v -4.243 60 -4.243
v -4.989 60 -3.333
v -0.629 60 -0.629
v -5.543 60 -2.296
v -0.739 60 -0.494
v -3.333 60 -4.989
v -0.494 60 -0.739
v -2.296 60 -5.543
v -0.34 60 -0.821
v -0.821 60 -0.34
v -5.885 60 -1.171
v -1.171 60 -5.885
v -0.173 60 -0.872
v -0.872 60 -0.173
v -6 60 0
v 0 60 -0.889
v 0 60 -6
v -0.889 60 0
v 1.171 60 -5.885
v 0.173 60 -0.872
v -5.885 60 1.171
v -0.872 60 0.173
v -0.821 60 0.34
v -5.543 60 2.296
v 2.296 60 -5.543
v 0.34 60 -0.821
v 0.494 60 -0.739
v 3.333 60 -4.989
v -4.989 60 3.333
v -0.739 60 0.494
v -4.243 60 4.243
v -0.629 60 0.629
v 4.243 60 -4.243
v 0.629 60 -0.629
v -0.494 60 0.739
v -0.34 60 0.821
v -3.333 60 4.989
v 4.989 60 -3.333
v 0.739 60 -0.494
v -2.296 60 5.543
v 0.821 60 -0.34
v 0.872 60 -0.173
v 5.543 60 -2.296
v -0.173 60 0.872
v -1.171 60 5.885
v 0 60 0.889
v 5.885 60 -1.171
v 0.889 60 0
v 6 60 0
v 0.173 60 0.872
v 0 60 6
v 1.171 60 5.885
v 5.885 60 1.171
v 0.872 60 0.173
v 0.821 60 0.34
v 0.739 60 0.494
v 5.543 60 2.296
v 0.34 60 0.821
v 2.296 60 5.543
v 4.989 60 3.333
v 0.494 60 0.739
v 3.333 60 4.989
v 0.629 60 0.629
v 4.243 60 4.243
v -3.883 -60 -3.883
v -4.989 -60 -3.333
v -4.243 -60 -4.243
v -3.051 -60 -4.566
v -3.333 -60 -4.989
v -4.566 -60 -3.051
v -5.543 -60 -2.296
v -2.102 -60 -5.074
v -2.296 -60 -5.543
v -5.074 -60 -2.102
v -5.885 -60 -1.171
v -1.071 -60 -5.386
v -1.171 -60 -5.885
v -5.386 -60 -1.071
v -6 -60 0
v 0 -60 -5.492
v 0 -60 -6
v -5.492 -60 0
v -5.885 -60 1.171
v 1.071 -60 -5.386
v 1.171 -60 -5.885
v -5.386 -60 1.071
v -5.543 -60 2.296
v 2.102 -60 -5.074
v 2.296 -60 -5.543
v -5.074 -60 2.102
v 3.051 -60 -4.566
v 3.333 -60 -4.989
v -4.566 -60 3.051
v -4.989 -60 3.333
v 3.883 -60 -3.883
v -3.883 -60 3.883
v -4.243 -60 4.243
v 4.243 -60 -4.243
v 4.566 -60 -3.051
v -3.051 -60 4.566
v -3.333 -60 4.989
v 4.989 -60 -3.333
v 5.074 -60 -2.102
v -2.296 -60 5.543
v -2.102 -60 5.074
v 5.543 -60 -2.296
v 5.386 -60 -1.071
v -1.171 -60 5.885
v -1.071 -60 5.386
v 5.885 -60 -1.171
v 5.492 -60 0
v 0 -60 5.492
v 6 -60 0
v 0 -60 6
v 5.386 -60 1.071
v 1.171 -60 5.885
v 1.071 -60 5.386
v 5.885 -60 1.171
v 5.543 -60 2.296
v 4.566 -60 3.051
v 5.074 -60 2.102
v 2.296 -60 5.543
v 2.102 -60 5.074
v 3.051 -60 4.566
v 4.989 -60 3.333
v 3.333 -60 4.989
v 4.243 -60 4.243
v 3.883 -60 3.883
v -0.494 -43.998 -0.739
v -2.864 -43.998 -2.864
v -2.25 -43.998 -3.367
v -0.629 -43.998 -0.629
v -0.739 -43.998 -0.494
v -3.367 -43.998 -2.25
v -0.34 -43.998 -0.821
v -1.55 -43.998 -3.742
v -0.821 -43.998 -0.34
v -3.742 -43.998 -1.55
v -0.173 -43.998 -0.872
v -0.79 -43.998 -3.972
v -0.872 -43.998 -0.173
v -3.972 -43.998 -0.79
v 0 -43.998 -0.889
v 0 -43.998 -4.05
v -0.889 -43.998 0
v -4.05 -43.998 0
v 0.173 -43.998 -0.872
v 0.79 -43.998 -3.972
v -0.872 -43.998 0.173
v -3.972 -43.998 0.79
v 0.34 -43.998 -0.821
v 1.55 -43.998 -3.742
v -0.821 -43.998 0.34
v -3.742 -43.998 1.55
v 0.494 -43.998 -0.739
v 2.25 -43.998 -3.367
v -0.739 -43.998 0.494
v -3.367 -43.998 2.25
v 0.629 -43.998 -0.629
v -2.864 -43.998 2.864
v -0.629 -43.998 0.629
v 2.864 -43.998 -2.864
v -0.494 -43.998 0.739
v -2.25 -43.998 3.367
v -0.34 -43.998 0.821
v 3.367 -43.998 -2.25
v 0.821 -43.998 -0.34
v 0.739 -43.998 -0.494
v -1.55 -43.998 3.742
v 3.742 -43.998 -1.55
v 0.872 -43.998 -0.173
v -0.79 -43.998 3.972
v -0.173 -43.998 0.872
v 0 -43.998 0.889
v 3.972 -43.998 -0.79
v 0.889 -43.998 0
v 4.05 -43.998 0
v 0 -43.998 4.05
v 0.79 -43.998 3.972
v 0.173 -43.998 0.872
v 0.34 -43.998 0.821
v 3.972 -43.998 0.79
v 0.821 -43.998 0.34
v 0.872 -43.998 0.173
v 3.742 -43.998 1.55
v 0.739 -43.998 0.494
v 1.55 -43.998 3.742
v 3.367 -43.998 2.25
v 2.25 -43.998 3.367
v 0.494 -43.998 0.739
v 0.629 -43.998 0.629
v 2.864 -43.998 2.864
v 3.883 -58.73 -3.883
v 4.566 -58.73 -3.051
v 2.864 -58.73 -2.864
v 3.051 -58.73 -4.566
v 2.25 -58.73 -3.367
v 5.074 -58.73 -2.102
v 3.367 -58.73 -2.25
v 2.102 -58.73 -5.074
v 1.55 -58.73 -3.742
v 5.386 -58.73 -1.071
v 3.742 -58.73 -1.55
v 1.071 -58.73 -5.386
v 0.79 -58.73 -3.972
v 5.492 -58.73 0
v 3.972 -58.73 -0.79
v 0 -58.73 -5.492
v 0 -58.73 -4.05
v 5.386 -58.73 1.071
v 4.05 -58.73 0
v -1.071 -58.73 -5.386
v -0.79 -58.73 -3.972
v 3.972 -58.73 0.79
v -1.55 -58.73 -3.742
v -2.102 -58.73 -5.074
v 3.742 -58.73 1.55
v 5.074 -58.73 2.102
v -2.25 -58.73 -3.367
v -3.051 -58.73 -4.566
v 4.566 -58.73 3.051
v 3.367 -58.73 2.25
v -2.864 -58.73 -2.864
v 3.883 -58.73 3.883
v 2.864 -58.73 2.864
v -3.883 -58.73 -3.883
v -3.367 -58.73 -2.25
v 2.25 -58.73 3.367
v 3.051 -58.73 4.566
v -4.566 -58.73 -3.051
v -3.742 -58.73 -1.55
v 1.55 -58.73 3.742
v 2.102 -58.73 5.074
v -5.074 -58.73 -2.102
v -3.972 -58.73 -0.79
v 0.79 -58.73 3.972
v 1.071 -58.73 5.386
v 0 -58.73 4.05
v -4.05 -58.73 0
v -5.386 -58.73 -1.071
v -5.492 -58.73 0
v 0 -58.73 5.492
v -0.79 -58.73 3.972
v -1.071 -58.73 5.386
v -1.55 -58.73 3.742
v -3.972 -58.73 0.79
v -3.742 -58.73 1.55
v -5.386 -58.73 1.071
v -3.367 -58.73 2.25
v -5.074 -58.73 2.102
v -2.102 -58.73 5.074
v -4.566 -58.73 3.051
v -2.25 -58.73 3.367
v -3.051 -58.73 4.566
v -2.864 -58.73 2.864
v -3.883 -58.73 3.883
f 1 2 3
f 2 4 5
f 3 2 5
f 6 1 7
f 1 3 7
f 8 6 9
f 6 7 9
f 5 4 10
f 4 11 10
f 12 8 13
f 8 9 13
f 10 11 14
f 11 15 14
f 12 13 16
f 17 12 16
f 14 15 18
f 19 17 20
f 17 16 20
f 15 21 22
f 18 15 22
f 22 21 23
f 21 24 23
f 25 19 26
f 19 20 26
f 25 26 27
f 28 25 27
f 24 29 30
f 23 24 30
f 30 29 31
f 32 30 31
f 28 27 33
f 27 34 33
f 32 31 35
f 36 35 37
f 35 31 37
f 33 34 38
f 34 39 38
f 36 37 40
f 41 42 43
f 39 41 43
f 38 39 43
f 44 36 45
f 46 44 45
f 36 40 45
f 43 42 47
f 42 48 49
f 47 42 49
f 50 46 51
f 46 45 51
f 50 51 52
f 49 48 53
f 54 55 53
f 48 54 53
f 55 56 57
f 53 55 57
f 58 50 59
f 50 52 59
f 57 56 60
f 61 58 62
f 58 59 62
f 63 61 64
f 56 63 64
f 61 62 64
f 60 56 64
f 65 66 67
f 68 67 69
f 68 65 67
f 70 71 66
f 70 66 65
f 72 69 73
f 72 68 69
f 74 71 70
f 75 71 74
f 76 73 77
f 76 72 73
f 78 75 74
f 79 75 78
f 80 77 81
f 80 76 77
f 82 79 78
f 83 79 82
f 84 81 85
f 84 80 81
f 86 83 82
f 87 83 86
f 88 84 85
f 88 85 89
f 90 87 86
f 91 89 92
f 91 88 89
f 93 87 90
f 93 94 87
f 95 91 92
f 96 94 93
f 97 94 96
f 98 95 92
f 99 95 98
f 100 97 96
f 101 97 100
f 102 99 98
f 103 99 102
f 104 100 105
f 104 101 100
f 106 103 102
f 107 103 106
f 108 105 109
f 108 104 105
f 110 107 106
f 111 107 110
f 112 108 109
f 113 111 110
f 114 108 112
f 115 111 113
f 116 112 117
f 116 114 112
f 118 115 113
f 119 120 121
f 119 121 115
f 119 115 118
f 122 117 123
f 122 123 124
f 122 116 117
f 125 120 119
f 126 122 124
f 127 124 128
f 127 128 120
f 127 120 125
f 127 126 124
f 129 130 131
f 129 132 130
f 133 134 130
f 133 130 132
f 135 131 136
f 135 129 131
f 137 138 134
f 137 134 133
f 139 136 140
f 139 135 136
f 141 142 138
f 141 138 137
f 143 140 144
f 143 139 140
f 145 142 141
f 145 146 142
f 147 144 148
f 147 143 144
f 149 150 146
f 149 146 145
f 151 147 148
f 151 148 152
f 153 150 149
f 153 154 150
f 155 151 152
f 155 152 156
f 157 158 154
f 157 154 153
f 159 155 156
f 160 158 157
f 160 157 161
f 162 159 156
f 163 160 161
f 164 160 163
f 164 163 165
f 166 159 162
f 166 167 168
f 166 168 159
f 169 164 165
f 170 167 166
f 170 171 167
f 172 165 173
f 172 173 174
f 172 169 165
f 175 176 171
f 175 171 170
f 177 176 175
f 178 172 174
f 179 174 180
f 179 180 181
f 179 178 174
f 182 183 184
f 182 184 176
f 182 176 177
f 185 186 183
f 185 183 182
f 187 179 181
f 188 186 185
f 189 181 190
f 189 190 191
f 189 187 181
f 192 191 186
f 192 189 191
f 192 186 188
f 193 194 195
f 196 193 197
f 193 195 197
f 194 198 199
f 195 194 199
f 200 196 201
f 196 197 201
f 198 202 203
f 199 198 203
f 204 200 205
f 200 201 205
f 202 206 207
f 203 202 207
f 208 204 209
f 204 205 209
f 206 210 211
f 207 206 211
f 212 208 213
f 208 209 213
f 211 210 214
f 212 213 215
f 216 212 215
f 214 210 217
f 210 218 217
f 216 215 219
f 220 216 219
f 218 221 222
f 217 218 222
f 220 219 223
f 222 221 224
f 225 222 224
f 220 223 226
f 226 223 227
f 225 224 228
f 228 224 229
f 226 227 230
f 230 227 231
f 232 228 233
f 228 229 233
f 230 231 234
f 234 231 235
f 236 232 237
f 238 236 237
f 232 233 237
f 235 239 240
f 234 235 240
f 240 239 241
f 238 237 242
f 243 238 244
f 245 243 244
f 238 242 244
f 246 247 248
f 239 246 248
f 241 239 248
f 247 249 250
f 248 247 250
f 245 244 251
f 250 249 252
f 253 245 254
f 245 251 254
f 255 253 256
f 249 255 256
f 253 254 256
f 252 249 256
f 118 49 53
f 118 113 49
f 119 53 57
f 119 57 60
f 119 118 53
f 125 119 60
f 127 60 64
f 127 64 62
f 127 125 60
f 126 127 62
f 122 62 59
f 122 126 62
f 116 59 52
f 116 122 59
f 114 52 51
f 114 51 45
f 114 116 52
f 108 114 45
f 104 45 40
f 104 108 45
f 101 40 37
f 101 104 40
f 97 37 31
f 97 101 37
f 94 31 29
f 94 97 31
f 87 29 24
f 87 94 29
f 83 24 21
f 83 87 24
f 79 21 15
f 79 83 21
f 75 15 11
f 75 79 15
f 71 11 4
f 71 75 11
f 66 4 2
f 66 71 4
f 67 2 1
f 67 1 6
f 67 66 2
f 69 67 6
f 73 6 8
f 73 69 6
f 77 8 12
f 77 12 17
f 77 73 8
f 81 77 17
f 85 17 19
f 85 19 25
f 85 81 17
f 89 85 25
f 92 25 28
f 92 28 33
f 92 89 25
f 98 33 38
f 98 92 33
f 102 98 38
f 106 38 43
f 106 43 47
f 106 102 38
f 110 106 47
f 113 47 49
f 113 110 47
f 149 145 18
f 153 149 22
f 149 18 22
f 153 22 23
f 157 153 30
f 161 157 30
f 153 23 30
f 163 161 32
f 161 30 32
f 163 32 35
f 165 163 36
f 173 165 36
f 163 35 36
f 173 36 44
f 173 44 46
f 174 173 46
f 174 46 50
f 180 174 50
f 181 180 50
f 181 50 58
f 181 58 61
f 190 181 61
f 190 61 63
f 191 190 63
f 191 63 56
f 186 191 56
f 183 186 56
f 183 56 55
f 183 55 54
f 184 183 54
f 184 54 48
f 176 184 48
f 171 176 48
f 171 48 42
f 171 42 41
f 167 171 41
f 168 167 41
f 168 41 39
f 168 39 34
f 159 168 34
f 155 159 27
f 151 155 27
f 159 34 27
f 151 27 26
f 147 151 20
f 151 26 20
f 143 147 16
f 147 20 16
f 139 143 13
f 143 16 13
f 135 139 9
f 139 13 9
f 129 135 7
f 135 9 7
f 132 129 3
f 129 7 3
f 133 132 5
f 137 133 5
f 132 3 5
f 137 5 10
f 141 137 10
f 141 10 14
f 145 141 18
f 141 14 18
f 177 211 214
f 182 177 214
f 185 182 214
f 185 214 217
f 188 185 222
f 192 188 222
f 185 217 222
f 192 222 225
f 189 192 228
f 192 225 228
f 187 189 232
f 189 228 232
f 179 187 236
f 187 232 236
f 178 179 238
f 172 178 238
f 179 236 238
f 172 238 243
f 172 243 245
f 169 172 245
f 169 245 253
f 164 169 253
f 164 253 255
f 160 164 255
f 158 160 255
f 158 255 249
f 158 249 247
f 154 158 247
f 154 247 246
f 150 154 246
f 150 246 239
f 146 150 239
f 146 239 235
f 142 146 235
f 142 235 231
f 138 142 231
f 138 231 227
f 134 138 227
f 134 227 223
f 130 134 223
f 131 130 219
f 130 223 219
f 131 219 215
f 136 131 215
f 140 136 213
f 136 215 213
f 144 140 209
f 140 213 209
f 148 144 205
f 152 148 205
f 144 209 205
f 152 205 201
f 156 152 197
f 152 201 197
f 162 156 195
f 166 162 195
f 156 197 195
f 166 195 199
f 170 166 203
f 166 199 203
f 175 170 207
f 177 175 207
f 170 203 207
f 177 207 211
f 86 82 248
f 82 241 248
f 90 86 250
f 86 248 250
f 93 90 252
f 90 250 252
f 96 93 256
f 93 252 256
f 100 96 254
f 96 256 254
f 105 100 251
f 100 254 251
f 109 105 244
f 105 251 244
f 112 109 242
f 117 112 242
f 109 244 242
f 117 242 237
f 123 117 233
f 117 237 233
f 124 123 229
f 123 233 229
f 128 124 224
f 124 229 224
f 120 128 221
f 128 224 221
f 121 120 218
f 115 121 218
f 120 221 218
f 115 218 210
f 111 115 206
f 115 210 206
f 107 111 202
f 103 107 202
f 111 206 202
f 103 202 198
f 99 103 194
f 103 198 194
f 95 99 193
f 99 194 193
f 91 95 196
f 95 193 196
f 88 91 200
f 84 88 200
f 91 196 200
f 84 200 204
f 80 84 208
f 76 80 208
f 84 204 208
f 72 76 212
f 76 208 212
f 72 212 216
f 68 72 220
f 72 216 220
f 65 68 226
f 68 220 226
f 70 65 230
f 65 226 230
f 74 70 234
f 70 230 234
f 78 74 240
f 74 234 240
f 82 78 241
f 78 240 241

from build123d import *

# Parameters (mm, degrees)
F0_R     = 6
F1_DEPTH = 60
F2_R     = 4.05
F3_DEPTH = 16.002
F4_R     = 0.889
F5_DEPTH = 120.001
F6_W     = 1.651
F6_H     = 1.27


with BuildPart() as f1:
    # F0 (on Front) → F1 (new body, symmetric)
    with BuildSketch(Plane.XZ):
        Circle(F0_R)
    extrude(amount=F1_DEPTH, both=True)

    # F2 (on face) → F3 (cut)
    with BuildSketch(Plane.XZ.offset(60)):
        Circle(F2_R)
    extrude(amount=-F3_DEPTH, mode=Mode.SUBTRACT)

    # F4 (on face) → F5 (cut, through all)
    with BuildSketch(Plane(origin=(0, 60, 0), x_dir=(-1, 0, 0), z_dir=(0, 1, 0))):
        Circle(F4_R)
    extrude(amount=-F5_DEPTH, mode=Mode.SUBTRACT)

    # F6 (on Top) → F7 (revolve, cut)
    with BuildSketch(Plane.XY):
        with Locations((-4.6665, -59.365)):
            Rectangle(F6_W, F6_H)
    revolve(axis=Axis((0, -59.477242, 0), (0, 1, 0)), mode=Mode.SUBTRACT)


solid = f1.part
